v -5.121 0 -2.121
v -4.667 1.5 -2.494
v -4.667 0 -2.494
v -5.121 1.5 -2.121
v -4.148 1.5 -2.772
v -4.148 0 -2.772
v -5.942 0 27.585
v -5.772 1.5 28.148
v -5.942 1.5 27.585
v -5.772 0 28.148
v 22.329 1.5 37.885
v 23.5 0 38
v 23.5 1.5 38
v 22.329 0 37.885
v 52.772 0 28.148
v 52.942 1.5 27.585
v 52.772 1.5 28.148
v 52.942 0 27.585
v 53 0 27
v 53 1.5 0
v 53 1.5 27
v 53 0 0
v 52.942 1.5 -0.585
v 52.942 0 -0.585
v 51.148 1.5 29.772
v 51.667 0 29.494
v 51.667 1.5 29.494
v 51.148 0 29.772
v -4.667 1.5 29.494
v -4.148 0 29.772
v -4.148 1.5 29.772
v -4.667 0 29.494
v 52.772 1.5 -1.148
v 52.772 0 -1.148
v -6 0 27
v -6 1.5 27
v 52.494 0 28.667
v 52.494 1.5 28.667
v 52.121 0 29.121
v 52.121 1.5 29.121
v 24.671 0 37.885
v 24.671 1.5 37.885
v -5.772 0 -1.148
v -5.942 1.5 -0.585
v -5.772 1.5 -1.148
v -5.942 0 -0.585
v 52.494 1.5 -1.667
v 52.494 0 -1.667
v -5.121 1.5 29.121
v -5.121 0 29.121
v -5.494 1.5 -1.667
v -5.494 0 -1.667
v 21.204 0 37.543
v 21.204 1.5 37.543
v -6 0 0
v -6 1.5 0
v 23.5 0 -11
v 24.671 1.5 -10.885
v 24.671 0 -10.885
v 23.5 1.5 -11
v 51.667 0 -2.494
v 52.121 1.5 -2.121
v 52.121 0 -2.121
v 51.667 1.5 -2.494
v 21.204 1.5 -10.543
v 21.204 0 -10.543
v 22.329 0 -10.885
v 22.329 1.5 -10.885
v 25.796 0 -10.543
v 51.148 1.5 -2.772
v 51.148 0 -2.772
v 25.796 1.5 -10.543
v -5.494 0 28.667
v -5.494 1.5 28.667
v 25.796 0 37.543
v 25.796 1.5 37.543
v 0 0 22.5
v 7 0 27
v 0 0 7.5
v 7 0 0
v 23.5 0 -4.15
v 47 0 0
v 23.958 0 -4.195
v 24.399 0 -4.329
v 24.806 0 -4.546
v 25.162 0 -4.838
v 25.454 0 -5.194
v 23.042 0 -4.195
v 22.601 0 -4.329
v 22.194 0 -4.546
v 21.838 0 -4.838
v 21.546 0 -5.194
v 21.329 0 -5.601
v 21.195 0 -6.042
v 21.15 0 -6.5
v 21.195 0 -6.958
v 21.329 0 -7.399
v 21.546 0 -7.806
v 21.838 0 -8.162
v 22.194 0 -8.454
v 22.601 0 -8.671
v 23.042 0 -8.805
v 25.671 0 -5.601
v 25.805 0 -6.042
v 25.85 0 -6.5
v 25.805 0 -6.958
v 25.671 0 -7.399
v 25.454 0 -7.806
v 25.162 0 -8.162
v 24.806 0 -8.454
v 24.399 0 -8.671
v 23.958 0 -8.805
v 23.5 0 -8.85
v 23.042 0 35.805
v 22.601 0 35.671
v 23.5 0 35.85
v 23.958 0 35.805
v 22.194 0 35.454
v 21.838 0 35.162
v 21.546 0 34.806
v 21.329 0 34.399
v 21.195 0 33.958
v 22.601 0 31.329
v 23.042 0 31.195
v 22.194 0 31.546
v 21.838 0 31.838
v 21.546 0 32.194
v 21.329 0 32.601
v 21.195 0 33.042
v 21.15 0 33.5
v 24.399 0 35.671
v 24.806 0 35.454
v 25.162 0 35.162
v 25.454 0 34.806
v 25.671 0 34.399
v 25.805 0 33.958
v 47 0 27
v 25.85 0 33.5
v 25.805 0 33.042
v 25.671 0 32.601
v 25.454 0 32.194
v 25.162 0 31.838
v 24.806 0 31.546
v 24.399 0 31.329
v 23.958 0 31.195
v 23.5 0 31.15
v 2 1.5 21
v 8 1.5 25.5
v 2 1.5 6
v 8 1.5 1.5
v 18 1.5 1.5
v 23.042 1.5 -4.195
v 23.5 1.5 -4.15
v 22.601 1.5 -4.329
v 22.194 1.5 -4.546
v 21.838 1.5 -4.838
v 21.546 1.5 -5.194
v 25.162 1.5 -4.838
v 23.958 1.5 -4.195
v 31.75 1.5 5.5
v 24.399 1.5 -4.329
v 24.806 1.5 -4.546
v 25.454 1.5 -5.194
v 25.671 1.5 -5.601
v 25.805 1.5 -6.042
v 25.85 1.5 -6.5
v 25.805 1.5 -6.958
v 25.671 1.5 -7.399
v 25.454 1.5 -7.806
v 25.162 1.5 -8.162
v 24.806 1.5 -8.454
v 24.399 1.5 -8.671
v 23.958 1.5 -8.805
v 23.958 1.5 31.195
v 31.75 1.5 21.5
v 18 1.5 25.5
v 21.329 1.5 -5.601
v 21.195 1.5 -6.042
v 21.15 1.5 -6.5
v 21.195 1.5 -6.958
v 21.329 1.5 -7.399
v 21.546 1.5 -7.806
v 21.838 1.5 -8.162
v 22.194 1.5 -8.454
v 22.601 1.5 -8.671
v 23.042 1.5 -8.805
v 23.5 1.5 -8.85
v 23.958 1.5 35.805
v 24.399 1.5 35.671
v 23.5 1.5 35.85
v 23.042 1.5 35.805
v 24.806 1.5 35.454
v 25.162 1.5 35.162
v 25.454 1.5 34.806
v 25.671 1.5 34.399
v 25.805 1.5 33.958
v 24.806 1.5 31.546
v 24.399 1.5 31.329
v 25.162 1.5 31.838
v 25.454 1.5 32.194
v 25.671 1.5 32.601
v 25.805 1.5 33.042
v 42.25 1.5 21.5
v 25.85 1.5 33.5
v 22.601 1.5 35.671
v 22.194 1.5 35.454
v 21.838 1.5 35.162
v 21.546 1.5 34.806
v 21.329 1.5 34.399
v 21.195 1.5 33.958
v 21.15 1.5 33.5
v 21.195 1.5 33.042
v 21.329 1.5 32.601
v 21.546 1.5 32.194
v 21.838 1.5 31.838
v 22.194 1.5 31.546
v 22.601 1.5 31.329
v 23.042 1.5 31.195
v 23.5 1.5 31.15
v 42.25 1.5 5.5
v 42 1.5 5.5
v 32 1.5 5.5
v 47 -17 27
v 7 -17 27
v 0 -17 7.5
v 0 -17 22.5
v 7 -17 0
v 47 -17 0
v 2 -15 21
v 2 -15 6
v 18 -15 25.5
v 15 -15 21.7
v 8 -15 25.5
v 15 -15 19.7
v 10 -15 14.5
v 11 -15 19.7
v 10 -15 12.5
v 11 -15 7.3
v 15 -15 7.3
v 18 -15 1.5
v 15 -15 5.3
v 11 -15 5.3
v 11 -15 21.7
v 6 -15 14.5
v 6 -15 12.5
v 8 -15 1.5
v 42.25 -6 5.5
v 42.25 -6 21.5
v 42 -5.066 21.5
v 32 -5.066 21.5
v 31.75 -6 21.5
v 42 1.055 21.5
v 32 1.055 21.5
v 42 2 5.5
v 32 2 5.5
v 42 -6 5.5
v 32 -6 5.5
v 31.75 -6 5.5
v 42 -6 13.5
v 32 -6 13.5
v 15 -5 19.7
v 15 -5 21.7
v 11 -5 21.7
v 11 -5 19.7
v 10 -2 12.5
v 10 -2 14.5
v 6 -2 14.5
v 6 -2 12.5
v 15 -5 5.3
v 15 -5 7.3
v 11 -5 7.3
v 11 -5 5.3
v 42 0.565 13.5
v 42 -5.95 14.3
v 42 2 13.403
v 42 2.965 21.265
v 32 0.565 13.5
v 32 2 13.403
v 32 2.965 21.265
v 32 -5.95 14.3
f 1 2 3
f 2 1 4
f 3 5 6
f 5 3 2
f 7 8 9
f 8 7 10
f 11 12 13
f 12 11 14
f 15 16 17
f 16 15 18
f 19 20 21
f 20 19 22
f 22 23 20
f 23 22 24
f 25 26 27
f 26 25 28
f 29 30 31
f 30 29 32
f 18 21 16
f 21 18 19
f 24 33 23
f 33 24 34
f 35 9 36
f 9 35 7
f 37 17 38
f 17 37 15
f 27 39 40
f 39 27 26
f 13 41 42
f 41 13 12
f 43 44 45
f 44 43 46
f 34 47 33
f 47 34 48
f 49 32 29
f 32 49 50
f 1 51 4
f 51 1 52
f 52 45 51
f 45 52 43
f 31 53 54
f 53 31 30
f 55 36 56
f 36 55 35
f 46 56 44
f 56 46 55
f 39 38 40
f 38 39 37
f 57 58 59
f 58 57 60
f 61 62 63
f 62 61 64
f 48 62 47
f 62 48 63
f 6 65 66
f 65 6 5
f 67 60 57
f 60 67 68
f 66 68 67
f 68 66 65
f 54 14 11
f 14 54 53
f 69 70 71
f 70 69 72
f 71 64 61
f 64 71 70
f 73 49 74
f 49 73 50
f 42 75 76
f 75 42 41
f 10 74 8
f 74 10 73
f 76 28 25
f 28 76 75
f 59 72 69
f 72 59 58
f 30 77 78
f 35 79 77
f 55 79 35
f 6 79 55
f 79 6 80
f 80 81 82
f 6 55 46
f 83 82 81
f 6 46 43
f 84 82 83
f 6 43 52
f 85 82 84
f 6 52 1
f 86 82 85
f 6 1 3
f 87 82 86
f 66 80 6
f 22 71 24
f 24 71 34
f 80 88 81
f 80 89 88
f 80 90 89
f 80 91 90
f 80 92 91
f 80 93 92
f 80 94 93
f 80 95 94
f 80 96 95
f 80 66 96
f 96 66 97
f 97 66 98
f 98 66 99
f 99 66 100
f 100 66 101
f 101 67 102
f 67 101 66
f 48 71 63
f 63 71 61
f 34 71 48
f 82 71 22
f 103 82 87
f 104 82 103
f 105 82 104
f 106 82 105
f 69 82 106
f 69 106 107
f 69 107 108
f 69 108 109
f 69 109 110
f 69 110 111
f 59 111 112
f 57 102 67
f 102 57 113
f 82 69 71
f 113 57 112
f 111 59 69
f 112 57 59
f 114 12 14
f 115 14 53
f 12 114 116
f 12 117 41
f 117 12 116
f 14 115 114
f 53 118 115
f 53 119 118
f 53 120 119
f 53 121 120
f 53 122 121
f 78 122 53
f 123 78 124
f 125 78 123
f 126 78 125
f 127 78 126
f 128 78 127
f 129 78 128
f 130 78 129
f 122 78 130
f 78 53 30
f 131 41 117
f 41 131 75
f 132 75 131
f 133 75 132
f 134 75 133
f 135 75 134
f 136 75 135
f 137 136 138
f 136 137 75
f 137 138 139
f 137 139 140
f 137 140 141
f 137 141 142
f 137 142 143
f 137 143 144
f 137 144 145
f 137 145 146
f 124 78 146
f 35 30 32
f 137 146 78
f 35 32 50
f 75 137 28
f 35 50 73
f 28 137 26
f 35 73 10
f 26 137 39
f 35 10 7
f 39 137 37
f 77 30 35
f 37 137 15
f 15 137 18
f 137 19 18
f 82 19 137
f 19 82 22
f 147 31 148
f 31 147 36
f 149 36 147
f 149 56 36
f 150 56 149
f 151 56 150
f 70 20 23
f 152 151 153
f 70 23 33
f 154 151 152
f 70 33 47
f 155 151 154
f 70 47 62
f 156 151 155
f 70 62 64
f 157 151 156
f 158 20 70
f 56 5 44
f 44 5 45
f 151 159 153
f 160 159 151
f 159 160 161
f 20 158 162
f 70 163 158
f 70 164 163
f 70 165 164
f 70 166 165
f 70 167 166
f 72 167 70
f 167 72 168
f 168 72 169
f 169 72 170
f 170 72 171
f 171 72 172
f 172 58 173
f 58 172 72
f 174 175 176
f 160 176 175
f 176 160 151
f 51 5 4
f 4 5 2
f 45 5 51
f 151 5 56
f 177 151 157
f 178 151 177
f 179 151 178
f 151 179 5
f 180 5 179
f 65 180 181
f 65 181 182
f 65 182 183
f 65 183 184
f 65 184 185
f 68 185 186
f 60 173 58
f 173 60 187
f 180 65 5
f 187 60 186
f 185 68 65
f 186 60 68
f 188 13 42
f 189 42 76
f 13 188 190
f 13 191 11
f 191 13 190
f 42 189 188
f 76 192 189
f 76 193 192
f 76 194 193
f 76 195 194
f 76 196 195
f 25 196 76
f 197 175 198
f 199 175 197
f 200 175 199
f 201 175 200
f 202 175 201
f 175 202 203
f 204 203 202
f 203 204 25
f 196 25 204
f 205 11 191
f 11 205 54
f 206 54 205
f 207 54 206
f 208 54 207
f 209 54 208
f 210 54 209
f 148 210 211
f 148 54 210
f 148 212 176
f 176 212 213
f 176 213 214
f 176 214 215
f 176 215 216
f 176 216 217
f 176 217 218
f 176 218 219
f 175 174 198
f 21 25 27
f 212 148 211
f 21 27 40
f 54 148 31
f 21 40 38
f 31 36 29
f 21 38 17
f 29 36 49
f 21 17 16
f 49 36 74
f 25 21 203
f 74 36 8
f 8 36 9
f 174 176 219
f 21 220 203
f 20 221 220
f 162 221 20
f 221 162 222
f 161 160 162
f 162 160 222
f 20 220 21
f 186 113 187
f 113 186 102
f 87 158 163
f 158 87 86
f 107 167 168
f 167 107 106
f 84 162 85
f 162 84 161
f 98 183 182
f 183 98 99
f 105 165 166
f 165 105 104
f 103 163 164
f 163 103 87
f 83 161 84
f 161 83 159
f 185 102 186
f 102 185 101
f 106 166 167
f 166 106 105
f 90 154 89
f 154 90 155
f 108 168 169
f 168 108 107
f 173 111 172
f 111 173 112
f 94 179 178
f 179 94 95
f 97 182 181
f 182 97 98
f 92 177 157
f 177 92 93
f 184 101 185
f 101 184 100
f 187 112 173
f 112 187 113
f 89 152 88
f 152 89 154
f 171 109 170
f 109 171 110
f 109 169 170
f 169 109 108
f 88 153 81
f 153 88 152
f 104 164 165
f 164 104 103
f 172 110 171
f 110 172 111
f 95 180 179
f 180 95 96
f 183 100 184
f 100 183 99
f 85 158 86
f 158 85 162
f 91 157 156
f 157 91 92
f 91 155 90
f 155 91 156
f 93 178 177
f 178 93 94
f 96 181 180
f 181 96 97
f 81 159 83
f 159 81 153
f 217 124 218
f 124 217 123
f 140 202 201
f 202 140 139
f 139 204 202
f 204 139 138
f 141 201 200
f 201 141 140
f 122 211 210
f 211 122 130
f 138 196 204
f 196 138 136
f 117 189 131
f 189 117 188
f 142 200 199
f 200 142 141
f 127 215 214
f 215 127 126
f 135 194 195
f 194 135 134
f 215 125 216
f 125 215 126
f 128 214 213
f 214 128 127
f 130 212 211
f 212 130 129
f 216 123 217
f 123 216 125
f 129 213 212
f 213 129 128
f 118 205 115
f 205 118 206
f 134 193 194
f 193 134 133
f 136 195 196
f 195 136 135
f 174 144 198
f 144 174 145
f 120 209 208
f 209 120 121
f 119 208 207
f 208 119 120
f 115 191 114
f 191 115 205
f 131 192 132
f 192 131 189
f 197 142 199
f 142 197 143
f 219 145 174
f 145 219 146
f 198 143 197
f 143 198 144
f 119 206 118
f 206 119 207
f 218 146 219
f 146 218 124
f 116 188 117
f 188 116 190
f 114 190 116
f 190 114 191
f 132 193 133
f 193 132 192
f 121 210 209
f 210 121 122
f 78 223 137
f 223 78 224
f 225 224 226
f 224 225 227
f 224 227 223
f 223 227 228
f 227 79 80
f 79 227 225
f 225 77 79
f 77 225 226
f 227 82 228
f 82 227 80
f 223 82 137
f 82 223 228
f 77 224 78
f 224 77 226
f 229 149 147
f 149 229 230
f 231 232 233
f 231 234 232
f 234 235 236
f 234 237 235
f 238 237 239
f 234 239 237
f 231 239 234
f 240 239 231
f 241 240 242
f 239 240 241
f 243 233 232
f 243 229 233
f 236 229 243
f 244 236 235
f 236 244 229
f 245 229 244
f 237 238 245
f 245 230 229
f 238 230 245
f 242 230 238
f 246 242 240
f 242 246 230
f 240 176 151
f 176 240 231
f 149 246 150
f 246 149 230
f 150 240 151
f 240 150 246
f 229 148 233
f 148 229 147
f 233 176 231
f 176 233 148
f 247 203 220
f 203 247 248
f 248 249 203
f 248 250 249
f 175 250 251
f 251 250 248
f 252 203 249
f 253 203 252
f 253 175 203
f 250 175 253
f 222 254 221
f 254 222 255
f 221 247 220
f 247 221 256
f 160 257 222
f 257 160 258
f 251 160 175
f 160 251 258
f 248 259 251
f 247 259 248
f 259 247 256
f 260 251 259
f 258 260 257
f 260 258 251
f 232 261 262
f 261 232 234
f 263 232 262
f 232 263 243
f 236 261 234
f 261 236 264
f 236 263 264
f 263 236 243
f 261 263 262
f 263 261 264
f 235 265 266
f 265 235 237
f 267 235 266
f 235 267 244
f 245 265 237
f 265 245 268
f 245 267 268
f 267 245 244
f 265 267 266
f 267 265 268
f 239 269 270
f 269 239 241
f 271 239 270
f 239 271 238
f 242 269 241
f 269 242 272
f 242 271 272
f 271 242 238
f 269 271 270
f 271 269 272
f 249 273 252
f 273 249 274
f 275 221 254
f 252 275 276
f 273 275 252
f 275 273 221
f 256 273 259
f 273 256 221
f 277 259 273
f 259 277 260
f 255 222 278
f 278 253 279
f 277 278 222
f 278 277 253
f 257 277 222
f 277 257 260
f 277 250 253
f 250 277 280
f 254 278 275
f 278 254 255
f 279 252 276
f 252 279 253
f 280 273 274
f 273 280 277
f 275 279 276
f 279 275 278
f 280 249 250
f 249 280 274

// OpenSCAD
iec_fused_inlet_model();


module iec_fused_inlet_model(){
  color("black")difference(){
    union(){
    translate([0,-17,0])hull(){
        translate([7,0,0])cube([40,17,27]);
        translate([0,0,7.5]) cube([47,17,15]);
    }//hull



    radius1 = 6;
    radius2 = 3;
    positions = [
        [47/2, -11+radius1, radius1],
        [47/2, 11+27-radius1, radius1],
        [radius2-6, 0, radius2],
        [radius2-6, 27, radius2],
        [47-radius2+6, 0, radius2],
        [47-radius2+6, 27, radius2],

    ];

    // Faceplate
    difference(){
      floor=0;
      hull(){
      for (pos = positions)
        translate([pos[0],floor, pos[1]])
            rotate([-90,0,0])cylinder(h=1.5, r=pos[2], $fn=32);
      }//hull

      // Screw moounts
      translate([47/2,-1,27/2-20])rotate([-90,0,0])cylinder(h=3, d=4.7, $fn=32);
      translate([47/2,-1,27/2+20])rotate([-90,0,0])cylinder(h=3, d=4.7, $fn=32);

      }//difference
   }//union

     //R14 Receptacle
   hull(){
     translate([0+8,-15,1.5])cube([10,17,24]);
     translate([-6+8,-15,6])cube([16,17,15]);
   }//hull
   translate([38-6.25,-6,5.5])cube([10.5,8,16]);
  }//difference

  //Power Swtitch
  translate([38-6,-6,5.5])color("red")cube([10,8,8]);
  translate([38-6,-5.95,5.5+8.8])rotate([-7,0,0])color("red")cube([10,8,8]);

  //Power Pins
  positions = [
        [11,23.5-3.8,11],
        [6,12.5,14],
        [11,1.5+3.8,11]
  ];
  for (pos = positions)
        translate([pos[0],-16, pos[1]])
            color("silver")cube([4,pos[2],2]);
}
